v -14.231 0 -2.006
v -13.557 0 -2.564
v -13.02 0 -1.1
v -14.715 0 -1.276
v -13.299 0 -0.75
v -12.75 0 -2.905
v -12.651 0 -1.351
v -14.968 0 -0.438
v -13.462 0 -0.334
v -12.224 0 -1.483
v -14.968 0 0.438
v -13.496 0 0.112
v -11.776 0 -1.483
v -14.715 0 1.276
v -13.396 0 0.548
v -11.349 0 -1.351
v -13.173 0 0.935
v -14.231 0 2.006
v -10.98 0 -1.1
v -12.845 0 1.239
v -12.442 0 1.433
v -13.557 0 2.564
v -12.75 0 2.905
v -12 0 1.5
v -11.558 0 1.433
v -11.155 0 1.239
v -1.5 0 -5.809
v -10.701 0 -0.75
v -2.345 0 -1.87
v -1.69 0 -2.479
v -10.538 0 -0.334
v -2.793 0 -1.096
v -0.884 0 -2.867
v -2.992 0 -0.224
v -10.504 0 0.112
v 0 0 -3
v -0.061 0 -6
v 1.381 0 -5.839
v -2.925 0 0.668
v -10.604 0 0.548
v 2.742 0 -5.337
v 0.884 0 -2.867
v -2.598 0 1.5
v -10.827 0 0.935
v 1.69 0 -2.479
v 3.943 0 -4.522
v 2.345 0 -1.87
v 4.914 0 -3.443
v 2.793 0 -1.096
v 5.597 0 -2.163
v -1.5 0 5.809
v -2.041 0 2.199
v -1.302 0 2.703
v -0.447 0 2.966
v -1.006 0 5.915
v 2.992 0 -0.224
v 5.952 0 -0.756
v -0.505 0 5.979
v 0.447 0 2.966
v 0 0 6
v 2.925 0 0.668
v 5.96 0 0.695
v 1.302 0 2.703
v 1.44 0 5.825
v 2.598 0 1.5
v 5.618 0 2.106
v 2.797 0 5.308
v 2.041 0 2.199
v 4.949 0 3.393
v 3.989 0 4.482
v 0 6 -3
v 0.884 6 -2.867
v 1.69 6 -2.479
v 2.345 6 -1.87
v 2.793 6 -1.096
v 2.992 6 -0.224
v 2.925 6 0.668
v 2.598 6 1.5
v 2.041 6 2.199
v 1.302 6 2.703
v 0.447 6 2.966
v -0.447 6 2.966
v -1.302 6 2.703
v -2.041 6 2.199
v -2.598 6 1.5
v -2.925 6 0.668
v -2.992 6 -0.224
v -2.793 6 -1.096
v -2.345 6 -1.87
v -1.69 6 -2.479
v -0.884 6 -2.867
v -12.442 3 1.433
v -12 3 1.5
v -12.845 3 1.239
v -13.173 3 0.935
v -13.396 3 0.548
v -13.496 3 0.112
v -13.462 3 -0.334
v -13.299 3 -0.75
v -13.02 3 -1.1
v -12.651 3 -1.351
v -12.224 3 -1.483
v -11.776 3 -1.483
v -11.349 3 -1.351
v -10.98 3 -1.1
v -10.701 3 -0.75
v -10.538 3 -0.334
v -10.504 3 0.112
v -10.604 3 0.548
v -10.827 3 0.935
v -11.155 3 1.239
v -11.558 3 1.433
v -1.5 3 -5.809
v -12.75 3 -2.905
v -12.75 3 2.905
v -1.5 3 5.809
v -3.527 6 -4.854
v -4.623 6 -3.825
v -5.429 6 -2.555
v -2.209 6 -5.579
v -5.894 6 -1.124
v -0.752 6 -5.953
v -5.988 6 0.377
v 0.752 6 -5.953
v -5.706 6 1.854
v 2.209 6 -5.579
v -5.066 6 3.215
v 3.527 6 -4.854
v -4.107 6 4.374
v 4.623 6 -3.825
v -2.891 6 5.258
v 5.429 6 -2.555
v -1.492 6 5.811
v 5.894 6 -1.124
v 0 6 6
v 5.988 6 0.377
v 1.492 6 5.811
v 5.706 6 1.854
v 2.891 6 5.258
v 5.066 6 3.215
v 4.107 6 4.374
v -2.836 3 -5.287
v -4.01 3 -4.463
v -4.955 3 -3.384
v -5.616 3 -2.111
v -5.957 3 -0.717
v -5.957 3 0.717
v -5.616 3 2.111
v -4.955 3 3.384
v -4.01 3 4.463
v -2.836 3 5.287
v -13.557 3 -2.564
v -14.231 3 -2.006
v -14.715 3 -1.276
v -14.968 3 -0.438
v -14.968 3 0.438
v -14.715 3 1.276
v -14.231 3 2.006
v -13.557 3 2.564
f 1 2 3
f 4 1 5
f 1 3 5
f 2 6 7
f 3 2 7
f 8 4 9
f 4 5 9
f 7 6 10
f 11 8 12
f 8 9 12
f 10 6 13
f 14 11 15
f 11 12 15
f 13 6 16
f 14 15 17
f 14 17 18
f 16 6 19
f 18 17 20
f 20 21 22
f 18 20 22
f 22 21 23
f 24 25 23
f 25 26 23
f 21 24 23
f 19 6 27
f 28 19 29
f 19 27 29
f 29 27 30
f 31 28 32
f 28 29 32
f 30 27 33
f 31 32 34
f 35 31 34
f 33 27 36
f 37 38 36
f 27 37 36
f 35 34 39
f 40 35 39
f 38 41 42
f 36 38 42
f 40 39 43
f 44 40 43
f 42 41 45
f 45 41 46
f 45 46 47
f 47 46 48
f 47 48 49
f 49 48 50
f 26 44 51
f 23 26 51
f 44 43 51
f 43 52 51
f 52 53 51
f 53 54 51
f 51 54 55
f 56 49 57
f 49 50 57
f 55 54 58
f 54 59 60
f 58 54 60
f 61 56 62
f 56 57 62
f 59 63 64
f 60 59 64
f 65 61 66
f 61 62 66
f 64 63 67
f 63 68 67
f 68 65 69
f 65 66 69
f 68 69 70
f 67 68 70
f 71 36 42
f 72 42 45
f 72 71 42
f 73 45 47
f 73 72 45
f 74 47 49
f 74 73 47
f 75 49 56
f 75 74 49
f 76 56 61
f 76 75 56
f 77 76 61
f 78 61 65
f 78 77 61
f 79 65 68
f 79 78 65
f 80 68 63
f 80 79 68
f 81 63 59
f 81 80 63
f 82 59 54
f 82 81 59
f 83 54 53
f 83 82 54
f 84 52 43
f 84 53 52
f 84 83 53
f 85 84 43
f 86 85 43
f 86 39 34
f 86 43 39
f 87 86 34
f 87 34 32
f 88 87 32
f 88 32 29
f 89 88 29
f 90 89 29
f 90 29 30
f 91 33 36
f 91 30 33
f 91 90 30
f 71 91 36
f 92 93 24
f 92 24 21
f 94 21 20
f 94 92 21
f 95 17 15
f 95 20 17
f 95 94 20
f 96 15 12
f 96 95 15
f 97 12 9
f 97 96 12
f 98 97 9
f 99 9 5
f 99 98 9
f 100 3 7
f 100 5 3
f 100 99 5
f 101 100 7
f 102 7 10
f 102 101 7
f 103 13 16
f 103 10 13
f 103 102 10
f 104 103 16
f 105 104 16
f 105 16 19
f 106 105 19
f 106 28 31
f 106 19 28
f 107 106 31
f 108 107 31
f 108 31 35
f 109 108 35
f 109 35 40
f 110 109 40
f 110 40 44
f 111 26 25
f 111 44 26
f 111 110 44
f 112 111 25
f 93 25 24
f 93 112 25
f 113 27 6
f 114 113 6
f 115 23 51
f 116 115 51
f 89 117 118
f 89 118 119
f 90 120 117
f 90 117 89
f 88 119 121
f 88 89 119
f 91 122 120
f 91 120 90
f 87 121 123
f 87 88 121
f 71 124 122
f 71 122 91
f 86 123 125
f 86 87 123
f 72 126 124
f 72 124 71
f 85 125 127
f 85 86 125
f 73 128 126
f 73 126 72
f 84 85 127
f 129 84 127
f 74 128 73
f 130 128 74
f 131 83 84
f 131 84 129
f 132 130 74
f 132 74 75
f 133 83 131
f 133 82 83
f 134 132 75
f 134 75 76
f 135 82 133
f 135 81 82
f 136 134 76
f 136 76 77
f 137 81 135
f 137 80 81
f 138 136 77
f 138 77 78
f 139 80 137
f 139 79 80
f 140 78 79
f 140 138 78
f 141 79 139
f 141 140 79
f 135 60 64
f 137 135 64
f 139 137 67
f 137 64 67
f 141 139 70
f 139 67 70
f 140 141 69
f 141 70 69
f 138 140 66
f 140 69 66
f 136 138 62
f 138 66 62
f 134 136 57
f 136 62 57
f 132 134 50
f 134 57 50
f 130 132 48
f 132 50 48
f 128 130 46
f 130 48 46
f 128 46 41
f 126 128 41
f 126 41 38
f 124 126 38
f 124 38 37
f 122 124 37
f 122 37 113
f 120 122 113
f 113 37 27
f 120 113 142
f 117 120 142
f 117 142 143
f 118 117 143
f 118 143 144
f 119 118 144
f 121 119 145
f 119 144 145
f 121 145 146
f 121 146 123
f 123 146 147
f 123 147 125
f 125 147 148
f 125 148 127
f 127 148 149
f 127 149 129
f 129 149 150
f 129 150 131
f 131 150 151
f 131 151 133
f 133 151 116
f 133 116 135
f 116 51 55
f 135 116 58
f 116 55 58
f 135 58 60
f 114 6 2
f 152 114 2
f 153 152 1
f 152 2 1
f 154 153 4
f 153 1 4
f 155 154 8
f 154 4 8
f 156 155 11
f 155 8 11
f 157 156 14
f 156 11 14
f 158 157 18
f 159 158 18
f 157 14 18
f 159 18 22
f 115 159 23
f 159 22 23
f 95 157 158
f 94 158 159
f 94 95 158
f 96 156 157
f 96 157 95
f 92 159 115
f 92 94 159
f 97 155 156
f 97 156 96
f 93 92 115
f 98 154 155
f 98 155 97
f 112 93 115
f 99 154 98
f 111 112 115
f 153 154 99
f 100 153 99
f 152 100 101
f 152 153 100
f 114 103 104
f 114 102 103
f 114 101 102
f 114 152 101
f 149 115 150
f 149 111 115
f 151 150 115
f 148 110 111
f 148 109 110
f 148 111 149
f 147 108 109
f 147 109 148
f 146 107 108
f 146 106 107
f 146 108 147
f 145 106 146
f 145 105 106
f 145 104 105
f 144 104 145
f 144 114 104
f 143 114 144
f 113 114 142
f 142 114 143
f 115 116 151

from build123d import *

# Parameters (mm, degrees)
BOSS_EXTRUDE1_DEPTH = 6
BOSS_EXTRUDE2_DEPTH = 3
SKETCH2_R           = 3
SKETCH2_R_2         = 1.5
CUT_EXTRUDE1_DEPTH  = 18.23368794


with BuildPart() as part:
    # Sketch1 → Boss-Extrude1 (new body)
    with BuildSketch(Plane(origin=(0, 0, 0), x_dir=(1, 0, 0), z_dir=(0, 1, 0))):
        with BuildLine():
            ThreePointArc((6, 0), (3.674234614, 4.74341649), (-1.5, 5.809475019))
            ThreePointArc((-1.5, 5.809475019), (-6, 0), (-1.5, -5.809475019))
            ThreePointArc((-1.5, -5.809475019), (3.674234614, -4.74341649), (6, 0))
        make_face()
    extrude(amount=BOSS_EXTRUDE1_DEPTH)

    # Sketch1<3> → Boss-Extrude2 (add)
    with BuildSketch(Plane(origin=(0, 0, 0), x_dir=(1, 0, 0), z_dir=(0, 1, 0))):
        with BuildLine():
            Line((-1.5, 5.809475019), (-12.75, 2.90473751))
            ThreePointArc((-12.75, 2.90473751), (-15, 0), (-12.75, -2.90473751))
            Line((-12.75, -2.90473751), (-1.5, -5.809475019))
            ThreePointArc((-1.5, -5.809475019), (-6, 0), (-1.5, 5.809475019))
        make_face()
    extrude(amount=BOSS_EXTRUDE2_DEPTH)

    # Sketch2 → Cut-Extrude1 (cut, through all)
    with BuildSketch(Plane.XZ.offset(-6)):
        Circle(SKETCH2_R)
        with Locations((-12, 0)):
            Circle(SKETCH2_R_2)
    extrude(amount=CUT_EXTRUDE1_DEPTH, mode=Mode.SUBTRACT)


solid = part.part
